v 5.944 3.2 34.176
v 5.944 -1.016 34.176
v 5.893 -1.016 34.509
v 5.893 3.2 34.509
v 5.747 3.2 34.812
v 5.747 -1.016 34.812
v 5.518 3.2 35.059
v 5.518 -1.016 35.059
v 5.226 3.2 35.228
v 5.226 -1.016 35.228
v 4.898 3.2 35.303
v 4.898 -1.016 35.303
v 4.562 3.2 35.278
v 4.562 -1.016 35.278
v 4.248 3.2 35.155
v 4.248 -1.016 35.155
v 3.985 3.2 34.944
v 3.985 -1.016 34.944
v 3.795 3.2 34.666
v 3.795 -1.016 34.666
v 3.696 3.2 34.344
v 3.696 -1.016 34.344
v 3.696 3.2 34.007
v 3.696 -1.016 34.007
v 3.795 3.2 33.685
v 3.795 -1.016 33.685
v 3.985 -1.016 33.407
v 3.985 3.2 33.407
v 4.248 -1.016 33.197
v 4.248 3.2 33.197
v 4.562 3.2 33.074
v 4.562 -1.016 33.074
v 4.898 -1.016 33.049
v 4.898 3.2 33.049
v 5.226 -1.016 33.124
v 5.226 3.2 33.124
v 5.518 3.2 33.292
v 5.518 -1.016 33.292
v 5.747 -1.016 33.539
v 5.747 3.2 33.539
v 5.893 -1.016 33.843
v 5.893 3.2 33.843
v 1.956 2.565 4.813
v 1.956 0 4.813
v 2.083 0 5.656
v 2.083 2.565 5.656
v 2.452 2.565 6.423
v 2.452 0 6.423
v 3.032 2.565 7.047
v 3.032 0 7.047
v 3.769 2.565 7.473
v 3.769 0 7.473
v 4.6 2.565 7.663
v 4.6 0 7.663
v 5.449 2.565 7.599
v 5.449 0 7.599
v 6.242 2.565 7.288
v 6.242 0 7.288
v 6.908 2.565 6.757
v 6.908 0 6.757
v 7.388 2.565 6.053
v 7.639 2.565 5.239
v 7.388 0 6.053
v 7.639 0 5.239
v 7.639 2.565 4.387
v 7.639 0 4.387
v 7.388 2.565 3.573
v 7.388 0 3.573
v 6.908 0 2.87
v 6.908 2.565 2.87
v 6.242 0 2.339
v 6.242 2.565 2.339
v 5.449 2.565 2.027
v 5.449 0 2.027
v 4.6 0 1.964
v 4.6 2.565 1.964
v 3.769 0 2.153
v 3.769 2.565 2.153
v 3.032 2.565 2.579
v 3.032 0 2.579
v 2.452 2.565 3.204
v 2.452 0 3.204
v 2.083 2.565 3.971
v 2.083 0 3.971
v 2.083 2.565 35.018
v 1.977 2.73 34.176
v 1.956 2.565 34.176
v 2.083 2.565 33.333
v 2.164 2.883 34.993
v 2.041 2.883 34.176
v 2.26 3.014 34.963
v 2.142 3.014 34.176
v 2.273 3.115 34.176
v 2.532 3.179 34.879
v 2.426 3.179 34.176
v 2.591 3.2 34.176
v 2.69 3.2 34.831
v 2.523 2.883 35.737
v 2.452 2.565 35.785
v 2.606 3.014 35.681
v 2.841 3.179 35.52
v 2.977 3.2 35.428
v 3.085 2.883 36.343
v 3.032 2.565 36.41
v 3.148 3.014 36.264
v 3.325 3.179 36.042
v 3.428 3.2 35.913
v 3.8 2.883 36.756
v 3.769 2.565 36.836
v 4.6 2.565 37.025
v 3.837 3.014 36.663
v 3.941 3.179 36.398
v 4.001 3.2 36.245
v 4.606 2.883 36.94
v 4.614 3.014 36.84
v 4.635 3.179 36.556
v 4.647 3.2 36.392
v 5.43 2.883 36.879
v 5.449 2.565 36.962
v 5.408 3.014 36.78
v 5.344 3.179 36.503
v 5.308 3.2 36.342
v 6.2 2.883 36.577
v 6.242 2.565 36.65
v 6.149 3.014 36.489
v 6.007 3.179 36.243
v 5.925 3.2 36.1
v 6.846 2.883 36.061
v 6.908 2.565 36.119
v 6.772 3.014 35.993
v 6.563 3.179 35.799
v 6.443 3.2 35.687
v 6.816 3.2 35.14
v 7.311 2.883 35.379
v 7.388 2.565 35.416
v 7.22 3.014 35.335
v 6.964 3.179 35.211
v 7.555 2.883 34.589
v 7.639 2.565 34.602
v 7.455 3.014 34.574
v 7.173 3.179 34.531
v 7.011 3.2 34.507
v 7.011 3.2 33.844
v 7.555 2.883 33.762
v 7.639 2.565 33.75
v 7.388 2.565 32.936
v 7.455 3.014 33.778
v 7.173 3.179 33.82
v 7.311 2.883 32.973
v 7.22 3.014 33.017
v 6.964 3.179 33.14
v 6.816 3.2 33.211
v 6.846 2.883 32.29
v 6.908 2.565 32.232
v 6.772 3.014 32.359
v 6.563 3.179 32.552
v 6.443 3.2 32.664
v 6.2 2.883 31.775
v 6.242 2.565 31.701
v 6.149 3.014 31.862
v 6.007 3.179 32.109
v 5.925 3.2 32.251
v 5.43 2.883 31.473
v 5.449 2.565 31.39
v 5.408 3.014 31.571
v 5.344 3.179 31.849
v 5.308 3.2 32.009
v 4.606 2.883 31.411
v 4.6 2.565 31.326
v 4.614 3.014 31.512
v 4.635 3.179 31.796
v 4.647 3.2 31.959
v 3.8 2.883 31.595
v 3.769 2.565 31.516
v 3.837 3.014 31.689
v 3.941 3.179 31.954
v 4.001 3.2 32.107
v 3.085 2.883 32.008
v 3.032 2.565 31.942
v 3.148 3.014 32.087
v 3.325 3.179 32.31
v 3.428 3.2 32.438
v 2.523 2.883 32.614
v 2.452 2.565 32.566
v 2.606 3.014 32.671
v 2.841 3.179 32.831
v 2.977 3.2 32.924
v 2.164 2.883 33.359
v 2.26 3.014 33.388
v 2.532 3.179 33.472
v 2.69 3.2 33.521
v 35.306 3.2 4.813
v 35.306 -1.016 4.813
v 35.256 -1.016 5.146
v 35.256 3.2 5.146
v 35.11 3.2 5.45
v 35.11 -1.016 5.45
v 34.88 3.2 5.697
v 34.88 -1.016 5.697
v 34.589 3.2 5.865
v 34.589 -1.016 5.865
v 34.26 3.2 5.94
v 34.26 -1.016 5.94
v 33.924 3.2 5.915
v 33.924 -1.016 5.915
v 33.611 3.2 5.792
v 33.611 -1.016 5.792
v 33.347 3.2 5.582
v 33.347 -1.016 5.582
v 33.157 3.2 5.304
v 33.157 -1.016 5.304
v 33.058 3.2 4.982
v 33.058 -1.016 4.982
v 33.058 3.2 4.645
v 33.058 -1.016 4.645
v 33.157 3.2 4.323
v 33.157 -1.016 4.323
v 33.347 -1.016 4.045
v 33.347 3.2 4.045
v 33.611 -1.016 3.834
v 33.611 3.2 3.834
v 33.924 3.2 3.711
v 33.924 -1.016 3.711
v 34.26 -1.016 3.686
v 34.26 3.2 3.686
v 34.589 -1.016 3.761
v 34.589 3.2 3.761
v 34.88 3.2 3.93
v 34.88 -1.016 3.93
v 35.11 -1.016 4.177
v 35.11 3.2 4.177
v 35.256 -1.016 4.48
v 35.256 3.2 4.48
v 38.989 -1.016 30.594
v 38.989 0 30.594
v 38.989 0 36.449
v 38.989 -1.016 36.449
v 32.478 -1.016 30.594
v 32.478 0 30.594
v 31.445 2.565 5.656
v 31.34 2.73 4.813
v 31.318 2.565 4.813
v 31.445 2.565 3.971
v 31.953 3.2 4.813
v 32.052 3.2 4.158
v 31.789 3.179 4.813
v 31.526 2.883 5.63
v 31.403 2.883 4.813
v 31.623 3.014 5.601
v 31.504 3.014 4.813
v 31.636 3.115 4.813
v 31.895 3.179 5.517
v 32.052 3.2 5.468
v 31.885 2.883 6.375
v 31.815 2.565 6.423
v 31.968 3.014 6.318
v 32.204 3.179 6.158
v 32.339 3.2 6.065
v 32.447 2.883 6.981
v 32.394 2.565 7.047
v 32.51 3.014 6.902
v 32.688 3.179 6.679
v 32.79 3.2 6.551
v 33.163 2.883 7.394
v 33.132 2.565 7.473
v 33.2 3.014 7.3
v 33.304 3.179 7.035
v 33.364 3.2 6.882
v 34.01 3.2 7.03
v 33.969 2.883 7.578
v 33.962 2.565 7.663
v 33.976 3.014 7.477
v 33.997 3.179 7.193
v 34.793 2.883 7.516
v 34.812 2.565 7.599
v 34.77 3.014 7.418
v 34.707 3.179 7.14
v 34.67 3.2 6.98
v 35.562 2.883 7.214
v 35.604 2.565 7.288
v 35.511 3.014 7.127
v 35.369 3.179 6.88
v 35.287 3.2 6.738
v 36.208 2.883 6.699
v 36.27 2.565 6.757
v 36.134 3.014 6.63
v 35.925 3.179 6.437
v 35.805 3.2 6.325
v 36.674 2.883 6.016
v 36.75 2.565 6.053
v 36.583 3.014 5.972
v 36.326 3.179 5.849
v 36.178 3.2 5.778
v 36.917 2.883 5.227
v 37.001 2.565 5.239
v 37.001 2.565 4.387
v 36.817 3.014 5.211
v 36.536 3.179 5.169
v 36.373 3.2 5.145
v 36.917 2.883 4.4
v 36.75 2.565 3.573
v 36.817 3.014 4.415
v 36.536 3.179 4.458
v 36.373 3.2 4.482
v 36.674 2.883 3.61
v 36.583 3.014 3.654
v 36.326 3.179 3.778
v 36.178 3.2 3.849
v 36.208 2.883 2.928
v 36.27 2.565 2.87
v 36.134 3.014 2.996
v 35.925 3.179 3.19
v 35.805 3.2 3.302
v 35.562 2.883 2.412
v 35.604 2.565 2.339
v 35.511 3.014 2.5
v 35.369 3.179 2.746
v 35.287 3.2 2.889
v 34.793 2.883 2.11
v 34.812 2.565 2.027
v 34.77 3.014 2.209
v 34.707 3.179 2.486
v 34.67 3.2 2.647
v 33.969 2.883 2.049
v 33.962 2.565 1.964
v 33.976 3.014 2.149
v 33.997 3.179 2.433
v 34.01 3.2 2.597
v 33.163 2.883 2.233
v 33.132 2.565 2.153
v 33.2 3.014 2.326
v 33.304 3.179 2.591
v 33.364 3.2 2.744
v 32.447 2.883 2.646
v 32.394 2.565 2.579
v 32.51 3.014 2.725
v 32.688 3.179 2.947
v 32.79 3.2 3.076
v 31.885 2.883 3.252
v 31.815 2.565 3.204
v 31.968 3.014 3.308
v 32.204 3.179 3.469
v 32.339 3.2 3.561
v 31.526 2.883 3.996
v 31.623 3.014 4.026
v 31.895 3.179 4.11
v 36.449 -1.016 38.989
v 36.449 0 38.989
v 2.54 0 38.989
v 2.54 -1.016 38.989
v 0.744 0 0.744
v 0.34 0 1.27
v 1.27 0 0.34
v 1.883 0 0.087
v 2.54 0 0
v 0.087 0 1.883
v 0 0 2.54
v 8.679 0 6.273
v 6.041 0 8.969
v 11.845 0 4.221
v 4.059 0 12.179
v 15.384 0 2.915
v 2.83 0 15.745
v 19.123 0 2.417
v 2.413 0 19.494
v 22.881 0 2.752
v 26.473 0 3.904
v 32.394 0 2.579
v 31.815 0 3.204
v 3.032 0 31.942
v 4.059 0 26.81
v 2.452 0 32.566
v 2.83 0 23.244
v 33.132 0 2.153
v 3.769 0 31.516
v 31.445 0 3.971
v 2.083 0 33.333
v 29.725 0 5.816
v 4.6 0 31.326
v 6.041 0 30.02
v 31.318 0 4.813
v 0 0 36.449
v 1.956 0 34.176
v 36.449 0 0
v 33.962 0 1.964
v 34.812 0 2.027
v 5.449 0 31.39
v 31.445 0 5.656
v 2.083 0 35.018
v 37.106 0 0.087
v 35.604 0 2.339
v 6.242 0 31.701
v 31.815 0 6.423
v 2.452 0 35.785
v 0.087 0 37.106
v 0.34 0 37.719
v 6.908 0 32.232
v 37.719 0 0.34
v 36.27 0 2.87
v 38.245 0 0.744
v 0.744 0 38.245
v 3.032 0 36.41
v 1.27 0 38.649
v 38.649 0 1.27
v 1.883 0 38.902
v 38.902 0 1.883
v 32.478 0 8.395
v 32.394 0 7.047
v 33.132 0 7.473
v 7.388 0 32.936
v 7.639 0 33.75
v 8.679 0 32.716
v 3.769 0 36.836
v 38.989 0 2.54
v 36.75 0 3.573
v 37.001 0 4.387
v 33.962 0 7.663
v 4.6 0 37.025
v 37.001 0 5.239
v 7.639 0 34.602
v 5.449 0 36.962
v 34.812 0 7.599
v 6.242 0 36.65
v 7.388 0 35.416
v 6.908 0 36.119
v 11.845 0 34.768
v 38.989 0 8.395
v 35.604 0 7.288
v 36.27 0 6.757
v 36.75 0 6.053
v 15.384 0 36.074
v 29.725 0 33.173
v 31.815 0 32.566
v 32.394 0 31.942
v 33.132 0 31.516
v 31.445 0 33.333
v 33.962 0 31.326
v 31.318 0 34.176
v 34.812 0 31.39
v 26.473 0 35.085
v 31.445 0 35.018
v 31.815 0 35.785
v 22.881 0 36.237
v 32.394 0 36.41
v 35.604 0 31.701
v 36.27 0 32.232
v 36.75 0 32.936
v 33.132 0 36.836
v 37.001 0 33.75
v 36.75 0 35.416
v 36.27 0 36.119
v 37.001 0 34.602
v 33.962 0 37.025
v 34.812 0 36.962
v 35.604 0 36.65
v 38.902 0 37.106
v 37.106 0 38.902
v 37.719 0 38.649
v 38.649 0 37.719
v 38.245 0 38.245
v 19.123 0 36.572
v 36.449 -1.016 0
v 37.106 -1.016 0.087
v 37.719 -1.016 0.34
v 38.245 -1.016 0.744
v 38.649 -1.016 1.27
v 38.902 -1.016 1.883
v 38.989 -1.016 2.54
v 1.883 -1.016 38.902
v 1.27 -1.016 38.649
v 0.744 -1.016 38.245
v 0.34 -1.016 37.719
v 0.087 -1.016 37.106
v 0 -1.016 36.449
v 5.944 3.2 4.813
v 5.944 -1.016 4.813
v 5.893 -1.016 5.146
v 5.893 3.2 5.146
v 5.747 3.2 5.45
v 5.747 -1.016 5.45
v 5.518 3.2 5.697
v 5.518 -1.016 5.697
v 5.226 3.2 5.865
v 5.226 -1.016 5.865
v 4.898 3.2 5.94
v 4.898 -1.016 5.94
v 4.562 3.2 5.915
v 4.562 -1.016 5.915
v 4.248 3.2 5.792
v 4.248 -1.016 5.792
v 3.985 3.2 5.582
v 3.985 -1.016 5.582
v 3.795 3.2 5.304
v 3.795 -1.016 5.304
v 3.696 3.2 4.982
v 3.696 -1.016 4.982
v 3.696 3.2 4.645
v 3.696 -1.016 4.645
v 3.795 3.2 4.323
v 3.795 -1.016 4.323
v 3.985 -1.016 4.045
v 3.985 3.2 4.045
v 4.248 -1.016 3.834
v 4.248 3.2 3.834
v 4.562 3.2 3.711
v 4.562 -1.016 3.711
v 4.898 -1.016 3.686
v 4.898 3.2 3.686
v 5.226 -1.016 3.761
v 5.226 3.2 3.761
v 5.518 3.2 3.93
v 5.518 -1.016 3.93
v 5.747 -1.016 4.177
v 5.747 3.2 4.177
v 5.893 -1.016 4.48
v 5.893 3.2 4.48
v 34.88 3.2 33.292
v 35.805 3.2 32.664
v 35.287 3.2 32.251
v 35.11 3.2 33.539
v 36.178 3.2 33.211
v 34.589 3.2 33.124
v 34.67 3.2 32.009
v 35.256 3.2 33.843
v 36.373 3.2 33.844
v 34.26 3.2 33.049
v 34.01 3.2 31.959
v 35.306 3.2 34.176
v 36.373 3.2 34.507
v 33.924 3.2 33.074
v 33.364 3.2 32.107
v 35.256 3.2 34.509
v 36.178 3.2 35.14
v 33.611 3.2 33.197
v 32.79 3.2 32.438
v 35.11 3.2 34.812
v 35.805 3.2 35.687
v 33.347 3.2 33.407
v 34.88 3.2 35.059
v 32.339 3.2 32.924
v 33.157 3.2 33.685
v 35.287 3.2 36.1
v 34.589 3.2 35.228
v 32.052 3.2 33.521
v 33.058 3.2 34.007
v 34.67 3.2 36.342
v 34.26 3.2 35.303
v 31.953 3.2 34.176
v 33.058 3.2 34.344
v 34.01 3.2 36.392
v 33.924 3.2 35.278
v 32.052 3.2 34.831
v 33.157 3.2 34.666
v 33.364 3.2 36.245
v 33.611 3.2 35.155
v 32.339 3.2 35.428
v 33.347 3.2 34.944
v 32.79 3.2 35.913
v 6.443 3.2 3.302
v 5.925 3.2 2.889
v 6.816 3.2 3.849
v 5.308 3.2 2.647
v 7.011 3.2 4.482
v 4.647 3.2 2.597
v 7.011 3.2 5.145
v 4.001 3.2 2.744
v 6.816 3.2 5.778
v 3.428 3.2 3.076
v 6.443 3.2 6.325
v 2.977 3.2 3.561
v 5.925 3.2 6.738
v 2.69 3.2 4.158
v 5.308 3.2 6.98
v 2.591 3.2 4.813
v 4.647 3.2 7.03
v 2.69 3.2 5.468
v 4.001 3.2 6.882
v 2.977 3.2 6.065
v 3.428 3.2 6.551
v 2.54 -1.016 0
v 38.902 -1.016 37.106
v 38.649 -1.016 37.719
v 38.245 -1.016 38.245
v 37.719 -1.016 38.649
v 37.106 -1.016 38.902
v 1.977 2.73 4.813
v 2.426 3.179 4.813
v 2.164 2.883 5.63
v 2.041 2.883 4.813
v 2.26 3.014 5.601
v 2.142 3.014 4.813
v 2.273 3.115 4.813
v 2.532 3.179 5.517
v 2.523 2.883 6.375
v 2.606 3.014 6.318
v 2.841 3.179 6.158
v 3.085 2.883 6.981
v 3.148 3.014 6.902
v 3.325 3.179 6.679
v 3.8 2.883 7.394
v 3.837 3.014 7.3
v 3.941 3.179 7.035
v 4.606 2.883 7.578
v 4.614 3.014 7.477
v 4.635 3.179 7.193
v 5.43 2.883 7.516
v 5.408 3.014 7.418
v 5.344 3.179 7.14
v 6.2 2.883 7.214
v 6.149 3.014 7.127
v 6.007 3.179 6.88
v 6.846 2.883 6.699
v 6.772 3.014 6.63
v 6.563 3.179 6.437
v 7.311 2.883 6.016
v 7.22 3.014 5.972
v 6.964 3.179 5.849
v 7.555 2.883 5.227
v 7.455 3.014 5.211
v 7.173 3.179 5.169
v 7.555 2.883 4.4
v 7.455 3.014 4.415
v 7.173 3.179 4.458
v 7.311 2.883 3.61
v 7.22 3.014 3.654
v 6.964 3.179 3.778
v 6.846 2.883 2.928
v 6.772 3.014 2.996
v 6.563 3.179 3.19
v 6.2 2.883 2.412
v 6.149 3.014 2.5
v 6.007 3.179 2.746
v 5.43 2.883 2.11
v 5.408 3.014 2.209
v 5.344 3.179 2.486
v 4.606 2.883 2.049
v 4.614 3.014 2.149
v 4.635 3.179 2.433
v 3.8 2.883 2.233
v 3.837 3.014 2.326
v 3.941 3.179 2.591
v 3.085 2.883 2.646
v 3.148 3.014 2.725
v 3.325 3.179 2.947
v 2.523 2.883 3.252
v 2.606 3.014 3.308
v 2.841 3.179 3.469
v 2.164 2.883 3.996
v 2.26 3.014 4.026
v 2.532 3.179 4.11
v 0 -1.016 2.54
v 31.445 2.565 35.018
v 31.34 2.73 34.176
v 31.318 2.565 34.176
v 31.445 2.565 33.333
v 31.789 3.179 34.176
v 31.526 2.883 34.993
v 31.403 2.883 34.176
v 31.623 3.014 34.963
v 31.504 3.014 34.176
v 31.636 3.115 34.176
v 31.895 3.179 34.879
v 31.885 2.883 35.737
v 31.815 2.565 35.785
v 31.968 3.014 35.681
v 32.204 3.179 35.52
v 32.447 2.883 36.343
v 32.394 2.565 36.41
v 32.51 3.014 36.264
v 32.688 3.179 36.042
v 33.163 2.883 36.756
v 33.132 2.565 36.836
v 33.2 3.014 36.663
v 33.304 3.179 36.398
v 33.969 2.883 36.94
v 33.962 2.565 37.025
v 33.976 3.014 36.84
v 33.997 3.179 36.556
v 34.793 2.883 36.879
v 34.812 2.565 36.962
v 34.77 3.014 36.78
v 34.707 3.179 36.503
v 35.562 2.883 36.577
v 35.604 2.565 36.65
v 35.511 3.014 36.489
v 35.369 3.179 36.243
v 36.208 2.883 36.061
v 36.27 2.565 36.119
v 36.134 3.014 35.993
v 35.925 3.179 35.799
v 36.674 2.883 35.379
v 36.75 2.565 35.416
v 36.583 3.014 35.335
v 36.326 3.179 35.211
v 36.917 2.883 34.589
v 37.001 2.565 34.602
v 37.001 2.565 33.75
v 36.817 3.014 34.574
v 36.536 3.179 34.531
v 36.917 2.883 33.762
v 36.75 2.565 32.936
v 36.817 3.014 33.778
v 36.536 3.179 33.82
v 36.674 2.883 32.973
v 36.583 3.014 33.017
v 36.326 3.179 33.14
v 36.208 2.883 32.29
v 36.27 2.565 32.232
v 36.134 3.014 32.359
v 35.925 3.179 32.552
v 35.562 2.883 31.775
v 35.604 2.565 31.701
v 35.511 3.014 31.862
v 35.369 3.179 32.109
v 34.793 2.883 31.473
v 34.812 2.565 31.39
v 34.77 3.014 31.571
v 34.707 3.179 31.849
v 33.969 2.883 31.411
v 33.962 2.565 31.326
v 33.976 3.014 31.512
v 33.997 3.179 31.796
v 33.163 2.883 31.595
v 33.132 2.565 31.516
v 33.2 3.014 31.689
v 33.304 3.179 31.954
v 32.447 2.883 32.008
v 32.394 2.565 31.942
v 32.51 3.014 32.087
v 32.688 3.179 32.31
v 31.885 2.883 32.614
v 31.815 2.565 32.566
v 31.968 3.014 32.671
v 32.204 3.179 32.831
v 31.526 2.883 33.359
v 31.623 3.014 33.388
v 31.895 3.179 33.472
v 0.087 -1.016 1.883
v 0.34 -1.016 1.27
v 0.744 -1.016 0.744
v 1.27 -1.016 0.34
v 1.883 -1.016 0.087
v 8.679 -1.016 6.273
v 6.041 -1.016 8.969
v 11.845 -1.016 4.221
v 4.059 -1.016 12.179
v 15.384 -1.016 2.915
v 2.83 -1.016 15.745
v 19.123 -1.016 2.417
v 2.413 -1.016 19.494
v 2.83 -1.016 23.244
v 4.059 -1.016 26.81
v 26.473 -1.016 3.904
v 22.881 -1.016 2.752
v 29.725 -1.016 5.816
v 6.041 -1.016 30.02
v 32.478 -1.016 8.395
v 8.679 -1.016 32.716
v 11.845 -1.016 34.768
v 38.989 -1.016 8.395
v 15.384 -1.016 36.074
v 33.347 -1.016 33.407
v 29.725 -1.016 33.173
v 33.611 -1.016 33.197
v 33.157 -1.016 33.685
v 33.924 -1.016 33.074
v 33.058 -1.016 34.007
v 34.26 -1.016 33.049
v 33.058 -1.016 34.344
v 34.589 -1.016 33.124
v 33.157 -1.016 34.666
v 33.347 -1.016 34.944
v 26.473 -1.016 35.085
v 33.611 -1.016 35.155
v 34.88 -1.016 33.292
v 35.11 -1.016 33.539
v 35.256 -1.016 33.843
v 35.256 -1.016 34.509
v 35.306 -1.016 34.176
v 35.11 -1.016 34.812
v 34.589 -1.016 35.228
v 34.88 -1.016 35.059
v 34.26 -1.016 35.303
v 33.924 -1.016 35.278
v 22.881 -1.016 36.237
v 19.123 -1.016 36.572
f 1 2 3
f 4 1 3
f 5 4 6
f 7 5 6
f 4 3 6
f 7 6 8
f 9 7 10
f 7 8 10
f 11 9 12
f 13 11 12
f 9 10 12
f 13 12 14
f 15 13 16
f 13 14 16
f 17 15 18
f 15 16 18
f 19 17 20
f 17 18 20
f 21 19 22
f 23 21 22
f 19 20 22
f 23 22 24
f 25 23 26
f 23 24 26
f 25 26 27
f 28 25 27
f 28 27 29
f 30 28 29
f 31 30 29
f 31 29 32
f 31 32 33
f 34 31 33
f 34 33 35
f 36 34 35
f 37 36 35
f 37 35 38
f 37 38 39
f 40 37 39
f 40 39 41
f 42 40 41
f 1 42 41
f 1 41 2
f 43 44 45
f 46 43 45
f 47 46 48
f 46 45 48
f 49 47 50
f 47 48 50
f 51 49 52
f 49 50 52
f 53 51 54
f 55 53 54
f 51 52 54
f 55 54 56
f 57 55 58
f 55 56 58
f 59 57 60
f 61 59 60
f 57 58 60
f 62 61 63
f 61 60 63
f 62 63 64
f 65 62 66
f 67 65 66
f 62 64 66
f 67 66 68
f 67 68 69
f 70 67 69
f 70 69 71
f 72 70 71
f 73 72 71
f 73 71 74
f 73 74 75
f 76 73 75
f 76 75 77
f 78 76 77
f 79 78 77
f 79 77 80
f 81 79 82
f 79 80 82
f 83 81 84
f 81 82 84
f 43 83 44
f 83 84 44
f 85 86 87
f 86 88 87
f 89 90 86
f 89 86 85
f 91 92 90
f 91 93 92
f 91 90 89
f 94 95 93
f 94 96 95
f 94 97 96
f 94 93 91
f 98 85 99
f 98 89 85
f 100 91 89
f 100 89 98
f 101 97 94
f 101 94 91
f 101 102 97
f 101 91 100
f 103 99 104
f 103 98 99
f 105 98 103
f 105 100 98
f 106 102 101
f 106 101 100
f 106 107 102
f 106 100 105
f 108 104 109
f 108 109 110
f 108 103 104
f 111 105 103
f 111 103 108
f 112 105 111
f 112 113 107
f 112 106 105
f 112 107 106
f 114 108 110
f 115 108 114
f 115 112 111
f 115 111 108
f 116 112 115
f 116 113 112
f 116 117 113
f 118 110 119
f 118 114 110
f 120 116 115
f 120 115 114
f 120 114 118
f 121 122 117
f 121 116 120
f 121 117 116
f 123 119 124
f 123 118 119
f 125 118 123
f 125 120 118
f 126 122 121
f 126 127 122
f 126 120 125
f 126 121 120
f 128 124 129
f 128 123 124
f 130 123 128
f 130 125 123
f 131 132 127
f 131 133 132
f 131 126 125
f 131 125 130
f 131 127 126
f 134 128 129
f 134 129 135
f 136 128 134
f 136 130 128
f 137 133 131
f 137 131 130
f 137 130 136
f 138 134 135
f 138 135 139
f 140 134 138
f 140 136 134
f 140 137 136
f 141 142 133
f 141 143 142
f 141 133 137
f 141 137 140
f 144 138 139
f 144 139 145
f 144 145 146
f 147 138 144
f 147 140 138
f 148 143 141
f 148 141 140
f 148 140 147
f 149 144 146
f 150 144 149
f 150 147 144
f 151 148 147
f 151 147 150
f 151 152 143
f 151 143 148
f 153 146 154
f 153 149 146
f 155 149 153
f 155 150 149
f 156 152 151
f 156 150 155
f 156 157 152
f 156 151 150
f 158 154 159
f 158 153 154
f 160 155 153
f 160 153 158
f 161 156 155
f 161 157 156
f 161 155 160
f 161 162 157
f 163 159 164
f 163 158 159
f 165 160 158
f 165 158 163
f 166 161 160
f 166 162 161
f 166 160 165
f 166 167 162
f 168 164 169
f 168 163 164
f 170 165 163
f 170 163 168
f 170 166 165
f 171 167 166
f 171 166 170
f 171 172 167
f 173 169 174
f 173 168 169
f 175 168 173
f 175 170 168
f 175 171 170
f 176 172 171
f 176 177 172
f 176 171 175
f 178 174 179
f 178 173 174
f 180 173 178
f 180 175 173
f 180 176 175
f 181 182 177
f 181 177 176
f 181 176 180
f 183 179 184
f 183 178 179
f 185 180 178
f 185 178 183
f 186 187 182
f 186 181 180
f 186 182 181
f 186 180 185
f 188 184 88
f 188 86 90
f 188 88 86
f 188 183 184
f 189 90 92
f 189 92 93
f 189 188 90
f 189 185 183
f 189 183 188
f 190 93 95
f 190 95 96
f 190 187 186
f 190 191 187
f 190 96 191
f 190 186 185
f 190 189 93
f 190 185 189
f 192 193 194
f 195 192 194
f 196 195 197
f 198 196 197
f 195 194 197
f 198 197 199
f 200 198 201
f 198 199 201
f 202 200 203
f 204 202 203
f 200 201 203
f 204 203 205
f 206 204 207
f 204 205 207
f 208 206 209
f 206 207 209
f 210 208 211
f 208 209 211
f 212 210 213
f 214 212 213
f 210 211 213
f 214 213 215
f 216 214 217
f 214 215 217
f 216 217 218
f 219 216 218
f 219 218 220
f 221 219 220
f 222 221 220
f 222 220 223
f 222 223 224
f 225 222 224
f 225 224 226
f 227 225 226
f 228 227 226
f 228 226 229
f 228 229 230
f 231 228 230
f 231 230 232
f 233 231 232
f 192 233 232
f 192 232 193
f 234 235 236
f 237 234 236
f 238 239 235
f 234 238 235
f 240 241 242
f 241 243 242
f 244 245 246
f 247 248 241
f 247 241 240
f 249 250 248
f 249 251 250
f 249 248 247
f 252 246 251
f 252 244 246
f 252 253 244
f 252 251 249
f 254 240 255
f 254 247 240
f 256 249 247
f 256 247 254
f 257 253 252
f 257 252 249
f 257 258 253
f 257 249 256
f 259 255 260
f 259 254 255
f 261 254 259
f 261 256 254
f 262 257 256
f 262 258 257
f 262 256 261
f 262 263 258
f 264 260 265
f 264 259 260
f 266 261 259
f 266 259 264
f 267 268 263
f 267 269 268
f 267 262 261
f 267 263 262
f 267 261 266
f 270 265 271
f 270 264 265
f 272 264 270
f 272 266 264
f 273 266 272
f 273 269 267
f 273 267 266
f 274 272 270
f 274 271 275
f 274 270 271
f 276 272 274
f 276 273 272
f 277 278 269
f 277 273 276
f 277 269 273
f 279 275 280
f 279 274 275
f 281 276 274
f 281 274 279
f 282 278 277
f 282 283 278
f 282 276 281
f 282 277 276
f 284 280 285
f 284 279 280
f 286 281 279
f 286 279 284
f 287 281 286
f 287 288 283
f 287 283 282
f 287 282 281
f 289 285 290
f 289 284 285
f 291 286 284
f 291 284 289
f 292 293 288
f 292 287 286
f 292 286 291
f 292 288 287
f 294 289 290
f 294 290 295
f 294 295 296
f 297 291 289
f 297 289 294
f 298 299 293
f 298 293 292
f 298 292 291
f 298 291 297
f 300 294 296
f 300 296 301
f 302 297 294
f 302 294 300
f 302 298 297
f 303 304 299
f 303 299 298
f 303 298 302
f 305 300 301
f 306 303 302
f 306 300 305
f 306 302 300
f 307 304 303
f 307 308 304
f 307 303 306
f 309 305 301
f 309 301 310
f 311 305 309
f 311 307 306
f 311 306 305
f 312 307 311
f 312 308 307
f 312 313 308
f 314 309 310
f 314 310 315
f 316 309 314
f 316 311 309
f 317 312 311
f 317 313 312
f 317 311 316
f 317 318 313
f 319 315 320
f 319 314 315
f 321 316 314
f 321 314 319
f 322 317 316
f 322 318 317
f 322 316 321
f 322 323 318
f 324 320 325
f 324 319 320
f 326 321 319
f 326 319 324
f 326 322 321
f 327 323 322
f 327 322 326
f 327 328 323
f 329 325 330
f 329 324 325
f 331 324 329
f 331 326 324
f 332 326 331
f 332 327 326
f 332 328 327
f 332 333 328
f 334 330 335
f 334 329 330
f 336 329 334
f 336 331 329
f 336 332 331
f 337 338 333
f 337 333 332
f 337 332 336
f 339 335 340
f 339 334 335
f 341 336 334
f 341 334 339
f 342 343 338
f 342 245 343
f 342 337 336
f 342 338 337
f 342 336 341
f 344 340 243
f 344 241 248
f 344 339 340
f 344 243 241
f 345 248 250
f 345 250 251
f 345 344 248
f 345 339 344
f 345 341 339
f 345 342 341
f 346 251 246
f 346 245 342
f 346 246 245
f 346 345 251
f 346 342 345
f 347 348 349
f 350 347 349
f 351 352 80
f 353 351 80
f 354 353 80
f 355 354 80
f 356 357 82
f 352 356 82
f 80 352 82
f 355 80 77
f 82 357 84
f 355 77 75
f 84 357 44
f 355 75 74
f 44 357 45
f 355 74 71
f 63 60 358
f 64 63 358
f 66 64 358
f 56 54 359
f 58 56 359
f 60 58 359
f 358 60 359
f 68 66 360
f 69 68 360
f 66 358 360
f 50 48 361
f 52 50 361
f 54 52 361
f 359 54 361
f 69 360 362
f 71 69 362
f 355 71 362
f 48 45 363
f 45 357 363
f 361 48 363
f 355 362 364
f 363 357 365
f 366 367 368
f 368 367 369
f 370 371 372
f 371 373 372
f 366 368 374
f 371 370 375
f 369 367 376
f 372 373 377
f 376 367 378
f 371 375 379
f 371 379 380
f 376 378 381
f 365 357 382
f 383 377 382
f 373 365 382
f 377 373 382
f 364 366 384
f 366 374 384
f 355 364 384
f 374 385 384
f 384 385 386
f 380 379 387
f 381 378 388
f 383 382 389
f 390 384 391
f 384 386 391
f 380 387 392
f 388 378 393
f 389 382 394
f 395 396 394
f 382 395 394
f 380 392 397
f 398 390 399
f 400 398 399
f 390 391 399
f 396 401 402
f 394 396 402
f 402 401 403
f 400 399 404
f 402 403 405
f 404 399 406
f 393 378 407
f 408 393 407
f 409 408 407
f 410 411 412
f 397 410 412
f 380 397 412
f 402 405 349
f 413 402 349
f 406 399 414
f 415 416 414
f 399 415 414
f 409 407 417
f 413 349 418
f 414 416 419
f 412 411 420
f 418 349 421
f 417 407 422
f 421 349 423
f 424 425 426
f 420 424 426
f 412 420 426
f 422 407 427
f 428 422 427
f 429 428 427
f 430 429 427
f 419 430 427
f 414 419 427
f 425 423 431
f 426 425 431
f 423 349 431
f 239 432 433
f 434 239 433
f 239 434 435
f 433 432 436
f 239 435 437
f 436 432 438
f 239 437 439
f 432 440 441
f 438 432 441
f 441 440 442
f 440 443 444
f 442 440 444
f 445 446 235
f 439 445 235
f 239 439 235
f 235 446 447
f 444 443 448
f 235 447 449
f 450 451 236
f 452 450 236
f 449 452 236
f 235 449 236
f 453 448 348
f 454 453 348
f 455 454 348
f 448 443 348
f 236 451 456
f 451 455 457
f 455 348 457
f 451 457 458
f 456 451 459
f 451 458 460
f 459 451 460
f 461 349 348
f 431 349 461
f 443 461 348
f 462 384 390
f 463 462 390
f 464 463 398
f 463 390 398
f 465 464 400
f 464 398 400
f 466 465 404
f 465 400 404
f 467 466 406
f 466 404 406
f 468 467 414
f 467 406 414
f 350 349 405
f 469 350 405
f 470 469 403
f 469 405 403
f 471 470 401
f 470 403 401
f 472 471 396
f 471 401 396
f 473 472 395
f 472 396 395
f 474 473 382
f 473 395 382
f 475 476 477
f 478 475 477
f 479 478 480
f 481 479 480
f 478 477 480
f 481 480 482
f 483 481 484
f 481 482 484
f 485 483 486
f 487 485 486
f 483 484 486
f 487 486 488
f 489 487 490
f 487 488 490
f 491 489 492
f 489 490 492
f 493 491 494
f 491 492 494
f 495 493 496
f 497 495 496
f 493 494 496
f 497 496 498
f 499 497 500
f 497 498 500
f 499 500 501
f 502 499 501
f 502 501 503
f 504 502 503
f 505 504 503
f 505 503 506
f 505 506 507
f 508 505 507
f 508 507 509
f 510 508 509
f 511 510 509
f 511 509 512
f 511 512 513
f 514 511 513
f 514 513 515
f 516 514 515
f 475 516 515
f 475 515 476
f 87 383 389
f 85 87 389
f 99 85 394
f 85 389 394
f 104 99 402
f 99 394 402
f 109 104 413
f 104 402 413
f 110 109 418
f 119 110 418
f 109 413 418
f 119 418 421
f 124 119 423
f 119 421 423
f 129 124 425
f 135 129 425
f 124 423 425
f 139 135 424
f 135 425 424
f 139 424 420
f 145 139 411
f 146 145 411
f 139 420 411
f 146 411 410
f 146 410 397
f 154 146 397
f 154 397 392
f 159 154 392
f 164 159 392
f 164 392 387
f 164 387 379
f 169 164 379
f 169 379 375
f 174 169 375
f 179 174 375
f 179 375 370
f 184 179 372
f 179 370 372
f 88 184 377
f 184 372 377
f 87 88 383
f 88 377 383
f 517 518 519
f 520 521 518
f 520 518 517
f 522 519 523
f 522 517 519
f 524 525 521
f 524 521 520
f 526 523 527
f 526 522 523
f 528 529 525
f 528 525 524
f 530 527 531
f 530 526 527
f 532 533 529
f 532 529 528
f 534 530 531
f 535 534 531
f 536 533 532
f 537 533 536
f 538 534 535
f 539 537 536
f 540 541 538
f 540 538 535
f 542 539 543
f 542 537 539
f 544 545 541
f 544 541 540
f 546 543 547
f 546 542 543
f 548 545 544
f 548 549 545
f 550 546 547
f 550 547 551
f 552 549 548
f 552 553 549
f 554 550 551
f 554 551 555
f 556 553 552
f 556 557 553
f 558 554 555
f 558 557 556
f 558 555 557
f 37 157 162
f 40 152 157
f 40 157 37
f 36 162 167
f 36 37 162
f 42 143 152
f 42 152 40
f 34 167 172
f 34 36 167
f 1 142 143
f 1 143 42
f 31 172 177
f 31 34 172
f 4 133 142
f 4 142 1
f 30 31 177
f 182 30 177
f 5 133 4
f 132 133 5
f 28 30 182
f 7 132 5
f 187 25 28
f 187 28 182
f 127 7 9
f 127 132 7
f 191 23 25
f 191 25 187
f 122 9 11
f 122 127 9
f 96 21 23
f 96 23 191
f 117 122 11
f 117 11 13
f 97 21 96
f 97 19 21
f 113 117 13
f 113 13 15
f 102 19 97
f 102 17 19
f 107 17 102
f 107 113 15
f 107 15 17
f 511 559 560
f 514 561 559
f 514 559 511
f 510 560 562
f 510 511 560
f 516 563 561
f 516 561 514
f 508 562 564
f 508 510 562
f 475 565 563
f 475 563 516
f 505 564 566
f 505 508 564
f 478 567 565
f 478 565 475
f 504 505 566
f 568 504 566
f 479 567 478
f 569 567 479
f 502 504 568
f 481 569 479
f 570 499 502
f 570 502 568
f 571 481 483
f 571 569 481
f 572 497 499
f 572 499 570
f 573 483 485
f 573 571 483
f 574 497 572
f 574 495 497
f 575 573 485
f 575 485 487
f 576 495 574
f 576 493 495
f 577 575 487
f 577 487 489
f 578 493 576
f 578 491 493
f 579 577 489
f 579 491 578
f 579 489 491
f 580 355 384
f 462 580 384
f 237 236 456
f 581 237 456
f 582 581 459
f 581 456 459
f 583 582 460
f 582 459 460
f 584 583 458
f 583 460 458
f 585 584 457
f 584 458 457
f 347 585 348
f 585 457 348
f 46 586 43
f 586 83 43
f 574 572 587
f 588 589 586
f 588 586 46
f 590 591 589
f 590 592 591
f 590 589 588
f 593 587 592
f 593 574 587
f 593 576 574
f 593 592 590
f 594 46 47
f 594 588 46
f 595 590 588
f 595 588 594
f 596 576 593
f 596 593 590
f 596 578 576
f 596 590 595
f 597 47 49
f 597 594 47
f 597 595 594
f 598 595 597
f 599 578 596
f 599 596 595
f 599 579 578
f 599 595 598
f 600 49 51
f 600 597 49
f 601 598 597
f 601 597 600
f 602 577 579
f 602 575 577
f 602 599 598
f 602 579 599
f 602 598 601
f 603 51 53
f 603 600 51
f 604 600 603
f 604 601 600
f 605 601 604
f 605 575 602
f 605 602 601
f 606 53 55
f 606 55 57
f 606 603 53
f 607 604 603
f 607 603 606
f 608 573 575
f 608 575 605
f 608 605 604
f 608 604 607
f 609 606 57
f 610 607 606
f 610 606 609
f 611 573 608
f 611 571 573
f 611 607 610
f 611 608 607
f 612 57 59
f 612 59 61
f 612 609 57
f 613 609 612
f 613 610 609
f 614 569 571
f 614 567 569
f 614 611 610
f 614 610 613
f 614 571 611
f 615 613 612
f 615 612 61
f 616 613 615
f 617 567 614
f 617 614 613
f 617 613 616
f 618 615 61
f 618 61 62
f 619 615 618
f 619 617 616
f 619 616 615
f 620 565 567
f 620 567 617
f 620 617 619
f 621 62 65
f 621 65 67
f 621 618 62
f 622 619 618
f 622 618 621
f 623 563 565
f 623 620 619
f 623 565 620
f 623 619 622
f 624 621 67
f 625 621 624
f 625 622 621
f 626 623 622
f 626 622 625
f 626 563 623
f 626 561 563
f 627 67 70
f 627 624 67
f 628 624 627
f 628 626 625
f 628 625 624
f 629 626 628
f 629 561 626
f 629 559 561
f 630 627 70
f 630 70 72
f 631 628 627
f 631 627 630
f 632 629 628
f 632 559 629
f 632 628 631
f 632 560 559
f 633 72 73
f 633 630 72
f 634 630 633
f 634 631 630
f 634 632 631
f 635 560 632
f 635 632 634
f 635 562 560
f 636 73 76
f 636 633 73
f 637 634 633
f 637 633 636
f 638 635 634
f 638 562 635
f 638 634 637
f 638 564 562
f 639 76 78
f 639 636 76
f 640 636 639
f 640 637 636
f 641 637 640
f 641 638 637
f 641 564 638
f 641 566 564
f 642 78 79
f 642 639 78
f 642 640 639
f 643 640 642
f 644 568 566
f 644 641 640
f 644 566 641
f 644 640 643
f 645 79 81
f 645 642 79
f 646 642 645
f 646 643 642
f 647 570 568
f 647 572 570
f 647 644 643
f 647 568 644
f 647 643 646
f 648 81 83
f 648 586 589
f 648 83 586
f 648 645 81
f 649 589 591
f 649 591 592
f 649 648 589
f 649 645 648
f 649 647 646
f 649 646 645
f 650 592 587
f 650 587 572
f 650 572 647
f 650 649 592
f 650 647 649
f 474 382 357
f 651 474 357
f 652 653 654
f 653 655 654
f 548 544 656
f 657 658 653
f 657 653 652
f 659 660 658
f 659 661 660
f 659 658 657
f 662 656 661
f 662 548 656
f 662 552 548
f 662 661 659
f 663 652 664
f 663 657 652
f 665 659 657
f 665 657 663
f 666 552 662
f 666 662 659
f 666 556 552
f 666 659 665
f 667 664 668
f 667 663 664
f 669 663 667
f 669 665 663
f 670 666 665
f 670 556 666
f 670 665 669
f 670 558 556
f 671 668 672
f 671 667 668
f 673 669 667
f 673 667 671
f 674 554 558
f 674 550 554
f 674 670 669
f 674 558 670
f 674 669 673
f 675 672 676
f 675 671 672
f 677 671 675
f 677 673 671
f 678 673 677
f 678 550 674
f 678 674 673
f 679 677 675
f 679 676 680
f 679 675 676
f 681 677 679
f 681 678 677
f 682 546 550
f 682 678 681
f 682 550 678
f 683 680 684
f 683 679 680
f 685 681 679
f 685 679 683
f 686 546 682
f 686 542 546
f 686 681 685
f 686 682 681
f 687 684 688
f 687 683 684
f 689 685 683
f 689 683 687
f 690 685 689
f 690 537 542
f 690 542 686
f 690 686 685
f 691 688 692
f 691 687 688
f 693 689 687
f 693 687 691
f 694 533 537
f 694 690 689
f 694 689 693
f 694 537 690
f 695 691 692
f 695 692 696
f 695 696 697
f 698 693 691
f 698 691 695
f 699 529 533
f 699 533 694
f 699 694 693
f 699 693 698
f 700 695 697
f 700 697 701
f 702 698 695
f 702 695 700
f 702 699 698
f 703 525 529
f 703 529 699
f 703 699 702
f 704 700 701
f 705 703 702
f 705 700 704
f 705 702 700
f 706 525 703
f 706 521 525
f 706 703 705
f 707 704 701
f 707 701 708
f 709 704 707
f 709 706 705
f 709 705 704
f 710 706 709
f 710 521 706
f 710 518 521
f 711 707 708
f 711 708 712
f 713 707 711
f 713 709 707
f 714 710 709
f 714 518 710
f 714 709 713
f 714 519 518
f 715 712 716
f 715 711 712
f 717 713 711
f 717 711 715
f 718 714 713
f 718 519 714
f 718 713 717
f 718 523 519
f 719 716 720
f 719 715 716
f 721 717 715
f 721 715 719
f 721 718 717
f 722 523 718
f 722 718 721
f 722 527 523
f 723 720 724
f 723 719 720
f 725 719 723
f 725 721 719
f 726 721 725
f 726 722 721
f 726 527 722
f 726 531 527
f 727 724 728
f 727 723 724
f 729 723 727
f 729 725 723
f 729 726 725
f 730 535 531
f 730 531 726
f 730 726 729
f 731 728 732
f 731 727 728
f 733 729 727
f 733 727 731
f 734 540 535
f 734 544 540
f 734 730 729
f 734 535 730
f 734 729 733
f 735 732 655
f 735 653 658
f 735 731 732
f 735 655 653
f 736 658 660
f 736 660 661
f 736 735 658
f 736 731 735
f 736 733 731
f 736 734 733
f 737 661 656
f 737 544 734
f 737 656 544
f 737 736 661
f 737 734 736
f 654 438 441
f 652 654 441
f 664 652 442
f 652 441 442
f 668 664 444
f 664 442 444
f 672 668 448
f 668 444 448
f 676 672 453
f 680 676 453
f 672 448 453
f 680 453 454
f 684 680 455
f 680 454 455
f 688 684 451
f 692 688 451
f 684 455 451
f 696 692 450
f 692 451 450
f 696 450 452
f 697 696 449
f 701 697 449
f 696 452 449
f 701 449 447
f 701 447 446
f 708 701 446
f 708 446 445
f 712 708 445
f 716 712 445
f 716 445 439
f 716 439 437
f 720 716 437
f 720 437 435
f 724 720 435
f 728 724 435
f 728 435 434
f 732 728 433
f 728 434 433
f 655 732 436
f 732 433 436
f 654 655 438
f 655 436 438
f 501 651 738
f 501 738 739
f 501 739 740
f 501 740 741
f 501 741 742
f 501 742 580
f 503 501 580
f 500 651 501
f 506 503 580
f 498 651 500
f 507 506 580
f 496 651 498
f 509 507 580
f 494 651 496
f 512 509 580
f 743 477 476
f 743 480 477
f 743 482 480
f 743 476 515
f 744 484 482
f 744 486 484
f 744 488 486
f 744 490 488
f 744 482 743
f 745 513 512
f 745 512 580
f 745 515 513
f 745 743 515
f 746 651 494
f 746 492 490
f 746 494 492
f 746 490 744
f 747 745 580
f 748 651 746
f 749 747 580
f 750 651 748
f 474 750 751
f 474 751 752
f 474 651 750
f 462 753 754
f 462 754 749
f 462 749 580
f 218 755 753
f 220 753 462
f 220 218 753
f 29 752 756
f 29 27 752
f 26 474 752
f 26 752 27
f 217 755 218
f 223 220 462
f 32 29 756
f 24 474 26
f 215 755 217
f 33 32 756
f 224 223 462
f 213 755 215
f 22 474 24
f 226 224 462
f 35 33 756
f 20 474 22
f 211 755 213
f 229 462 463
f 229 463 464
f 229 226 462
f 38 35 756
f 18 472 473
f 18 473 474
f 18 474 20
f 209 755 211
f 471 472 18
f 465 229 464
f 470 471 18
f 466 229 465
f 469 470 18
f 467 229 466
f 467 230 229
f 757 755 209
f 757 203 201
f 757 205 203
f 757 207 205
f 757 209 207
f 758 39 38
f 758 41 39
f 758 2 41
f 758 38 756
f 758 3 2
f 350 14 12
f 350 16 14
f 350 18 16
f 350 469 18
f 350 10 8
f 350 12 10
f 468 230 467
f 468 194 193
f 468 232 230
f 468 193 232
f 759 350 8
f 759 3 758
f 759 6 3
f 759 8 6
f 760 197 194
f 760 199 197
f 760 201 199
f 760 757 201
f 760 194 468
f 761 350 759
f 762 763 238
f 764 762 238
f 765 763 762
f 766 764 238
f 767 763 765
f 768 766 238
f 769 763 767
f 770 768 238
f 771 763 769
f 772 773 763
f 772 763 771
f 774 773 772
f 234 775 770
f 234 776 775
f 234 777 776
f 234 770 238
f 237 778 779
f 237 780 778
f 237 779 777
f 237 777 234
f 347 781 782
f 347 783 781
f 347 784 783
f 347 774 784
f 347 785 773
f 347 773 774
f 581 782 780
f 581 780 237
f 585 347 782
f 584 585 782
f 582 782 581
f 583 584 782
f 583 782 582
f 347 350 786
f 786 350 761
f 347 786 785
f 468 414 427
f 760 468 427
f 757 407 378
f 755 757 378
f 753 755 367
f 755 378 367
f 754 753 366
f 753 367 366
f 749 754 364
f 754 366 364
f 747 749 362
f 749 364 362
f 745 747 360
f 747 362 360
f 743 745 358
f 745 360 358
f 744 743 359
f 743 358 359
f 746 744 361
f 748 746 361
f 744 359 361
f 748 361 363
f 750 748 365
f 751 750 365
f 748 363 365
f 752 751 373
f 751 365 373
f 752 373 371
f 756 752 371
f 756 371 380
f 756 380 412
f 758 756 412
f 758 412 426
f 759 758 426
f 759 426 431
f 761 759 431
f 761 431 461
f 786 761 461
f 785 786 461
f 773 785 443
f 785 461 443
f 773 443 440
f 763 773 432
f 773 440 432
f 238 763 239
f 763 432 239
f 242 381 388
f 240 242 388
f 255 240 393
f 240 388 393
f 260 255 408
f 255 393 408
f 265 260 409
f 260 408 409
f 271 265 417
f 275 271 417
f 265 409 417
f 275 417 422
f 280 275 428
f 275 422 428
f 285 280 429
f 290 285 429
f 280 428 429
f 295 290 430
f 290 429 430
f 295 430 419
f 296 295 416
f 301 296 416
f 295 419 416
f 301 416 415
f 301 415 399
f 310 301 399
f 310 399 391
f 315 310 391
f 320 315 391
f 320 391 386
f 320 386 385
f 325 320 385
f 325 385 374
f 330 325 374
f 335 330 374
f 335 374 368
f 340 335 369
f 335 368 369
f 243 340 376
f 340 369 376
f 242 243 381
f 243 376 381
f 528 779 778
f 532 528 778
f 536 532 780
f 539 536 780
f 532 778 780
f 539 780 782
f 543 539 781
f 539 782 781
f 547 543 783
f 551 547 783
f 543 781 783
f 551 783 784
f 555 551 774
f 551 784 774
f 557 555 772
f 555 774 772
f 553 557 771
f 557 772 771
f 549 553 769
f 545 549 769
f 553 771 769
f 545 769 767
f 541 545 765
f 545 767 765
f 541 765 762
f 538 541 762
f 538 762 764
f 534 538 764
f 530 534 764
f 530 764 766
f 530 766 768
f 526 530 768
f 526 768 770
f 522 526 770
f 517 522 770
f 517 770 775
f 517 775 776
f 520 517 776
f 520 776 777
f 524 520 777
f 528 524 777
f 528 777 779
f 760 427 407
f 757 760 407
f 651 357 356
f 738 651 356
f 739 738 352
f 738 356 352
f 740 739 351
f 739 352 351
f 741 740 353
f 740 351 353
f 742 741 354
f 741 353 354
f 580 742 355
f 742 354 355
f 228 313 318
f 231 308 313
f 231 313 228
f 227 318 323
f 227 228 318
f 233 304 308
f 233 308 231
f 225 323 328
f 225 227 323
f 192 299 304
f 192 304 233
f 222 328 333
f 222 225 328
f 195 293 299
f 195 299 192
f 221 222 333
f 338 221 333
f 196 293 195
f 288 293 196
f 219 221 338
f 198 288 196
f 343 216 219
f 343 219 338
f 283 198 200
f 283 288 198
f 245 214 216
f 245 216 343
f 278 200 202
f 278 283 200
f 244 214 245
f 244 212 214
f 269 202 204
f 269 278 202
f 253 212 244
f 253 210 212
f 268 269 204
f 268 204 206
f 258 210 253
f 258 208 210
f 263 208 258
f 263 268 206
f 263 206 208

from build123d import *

# Parameters (mm, degrees)
F1_DEPTH = 1.016
F2_R     = 2.8575
F3_DEPTH = 3.2004
F5_D     = 2.2606
F6_R     = 0.635


with BuildPart() as f1:
    # F0 (on Front) → F1 (new body)
    with BuildSketch(Plane.XZ):
        with BuildLine():
            ThreePointArc((0, 2.54), (0.7439487758, 0.7439487758), (2.54, 0))
            Line((2.54, 0), (36.449, 0))
            ThreePointArc((36.449, 0), (38.2450512242, 0.7439487758), (38.989, 2.54))
            Line((38.989, 2.54), (38.989, 8.3947))
            Line((38.989, 8.3947), (32.4780311919, 8.3947))
            ThreePointArc((32.4780311919, 8.3947), (2.413, 19.4945), (32.4780311919, 30.5943))
            Line((32.4780311919, 30.5943), (38.989, 30.5943))
            Line((38.989, 30.5943), (38.989, 36.449))
            ThreePointArc((38.989, 36.449), (38.2450512242, 38.2450512242), (36.449, 38.989))
            Line((36.449, 38.989), (2.54, 38.989))
            ThreePointArc((2.54, 38.989), (0.7439487758, 38.2450512242), (0, 36.449))
            Line((0, 36.449), (0, 2.54))
        make_face()
    extrude(amount=F1_DEPTH)

    # F2 (on face) → F3 (join)
    with BuildSketch(Plane(origin=(0, 0, 0), x_dir=(-1, 0, 0), z_dir=(0, 1, 0))):
        with Locations((-34.1757, 34.1757)):
            Circle(F2_R)
        with Locations((-4.8133, 34.1757)):
            Circle(F2_R)
        with Locations((-4.8133, 4.8133)):
            Circle(F2_R)
        with Locations((-34.1757, 4.8133)):
            Circle(F2_R)
    extrude(amount=F3_DEPTH)

    # F5 (through all)
    with Locations(Plane(origin=(0, 3.2004, 0), x_dir=(-1, 0, 0), z_dir=(0, 1, 0))):
        with Locations((-34.1757, 34.1757), (-4.8133, 4.8133), (-34.1757, 4.8133), (-4.8133, 34.1757)):
            Hole(F5_D / 2)

    # F6
    f6_edges = [f1.edges().sort_by_distance(p)[0] for p in [
        (37.0332, 3.2004, 34.1757),
        (7.6708, 3.2004, 34.1757),
        (7.6708, 3.2004, 4.8133),
        (37.0332, 3.2004, 4.8133),
    ]]
    fillet(f6_edges, radius=F6_R)


solid = f1.part
